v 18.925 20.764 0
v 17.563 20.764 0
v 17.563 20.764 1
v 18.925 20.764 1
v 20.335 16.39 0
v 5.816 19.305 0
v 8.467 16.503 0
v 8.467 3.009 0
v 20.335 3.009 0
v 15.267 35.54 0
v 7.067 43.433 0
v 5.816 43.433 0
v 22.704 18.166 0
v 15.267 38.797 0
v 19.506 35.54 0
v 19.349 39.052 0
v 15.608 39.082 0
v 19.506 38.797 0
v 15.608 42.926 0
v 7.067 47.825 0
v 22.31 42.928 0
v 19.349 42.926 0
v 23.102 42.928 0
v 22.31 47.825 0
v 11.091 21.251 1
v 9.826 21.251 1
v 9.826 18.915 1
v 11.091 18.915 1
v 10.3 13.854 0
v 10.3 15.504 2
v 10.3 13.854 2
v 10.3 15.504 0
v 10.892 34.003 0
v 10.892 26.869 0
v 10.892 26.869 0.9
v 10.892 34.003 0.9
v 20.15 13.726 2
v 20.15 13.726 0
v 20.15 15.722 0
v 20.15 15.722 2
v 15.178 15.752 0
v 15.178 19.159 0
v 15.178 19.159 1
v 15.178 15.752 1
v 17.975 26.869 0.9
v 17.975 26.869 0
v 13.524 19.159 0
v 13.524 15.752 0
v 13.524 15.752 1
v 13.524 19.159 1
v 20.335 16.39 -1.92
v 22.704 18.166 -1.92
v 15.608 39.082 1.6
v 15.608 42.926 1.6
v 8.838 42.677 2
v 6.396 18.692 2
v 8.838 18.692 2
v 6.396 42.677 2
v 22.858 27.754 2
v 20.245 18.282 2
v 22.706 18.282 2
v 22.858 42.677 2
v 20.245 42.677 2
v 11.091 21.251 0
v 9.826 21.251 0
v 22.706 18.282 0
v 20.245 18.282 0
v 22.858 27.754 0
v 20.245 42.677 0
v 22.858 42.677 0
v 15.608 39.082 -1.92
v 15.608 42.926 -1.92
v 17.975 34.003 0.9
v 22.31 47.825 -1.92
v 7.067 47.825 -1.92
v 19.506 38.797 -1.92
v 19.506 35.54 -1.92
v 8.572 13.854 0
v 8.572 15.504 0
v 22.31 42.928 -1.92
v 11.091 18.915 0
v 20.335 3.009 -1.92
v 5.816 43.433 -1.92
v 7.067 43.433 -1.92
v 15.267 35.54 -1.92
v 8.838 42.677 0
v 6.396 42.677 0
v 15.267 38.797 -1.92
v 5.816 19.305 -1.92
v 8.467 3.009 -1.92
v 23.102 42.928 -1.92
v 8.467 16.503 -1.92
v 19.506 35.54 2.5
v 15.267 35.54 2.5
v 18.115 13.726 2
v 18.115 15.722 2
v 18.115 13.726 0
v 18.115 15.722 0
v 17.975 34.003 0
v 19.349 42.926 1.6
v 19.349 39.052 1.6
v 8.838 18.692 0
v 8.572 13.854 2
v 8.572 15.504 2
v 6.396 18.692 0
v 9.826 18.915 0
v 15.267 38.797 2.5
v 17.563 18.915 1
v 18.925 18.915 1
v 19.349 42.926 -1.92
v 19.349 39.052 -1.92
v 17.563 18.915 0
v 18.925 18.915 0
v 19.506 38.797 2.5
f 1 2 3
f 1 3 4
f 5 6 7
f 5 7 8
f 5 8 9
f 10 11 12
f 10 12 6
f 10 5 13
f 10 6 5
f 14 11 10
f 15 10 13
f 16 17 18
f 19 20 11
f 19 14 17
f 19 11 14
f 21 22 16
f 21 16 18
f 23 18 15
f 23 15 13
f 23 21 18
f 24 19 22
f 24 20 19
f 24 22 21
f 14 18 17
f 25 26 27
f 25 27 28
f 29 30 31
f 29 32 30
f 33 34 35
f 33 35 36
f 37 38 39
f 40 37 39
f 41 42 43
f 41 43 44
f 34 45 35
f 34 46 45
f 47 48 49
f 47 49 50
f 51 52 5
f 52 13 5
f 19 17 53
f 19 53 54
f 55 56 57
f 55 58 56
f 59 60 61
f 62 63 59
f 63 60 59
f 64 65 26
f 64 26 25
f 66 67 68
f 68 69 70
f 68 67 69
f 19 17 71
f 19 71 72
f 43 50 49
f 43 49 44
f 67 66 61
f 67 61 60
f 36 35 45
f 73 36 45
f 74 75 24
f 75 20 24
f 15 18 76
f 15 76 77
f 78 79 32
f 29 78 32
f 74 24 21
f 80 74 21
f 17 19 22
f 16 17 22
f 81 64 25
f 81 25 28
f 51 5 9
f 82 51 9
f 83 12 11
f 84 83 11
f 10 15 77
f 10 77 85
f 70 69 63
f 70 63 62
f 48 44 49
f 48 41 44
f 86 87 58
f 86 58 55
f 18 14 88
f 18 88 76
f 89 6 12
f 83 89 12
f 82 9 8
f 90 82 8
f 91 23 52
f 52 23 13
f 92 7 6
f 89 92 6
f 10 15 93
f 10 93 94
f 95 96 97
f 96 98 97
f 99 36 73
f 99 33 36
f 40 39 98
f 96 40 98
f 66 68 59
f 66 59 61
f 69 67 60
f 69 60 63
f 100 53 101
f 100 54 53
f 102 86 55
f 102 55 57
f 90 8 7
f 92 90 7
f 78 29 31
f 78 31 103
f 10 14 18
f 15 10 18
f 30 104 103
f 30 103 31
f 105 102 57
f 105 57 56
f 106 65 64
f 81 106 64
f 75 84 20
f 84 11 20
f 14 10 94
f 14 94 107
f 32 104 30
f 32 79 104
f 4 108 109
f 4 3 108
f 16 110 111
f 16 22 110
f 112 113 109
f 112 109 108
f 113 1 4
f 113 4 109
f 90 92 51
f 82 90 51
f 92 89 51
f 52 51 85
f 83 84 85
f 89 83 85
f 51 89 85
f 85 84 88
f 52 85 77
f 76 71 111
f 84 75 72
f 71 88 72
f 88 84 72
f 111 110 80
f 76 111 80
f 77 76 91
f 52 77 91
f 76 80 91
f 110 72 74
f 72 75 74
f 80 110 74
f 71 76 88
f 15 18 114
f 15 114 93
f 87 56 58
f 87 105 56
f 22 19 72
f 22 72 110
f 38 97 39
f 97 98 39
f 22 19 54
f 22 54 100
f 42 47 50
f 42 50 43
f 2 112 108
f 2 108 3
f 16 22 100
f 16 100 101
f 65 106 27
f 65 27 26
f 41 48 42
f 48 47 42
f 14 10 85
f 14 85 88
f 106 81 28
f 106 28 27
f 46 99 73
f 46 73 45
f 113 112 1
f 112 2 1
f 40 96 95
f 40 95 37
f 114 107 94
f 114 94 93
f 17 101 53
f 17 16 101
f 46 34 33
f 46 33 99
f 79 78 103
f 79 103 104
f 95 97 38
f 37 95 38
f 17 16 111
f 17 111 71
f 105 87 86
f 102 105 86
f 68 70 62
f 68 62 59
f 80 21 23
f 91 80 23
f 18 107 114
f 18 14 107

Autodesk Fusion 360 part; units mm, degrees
sketch "Sketch1" plane through (0, 0, 0) normal (0, 0, 1) x (1, 0, 0)
  line L0 (7.0671, 47.8249) -> (22.3102, 47.8249)
  line L1 (22.3102, 47.8249) -> (22.3102, 42.9285)
  line L2 (22.3102, 42.9285) -> (23.1024, 42.9285)
  line L3 (23.1024, 42.9285) -> (22.7044, 18.166)
  line L4 (22.7044, 18.166) -> (20.3351, 16.3902)
  line L5 (20.3351, 16.3902) -> (20.3351, 3.0086)
  line L6 (20.3351, 3.0086) -> (8.4669, 3.0086)
  line L7 (8.4669, 3.0086) -> (8.4669, 16.5034)
  line L8 (8.4669, 16.5034) -> (5.8161, 19.3048)
  line L9 (5.8161, 19.3048) -> (5.8161, 43.4328)
  line L10 (5.8161, 43.4328) -> (7.0671, 43.4328)
  line L11 (7.0671, 43.4328) -> (7.0671, 47.8249)
  line L12 (15.2672, 35.5395) -> (15.2672, 38.7967)
  line L13 (15.2672, 38.7967) -> (19.5064, 38.7967)
  line L14 (19.5064, 38.7967) -> (19.5064, 35.5395)
  line L15 (19.5064, 35.5395) -> (15.2672, 35.5395)
  line L16 (15.6085, 39.0819) -> (15.6085, 42.9261)
  line L17 (15.6085, 42.9261) -> (19.3493, 42.9261)
  line L18 (19.3493, 42.9261) -> (19.3493, 39.0523)
  line L19 (19.3493, 39.0523) -> (15.6085, 39.0819)
  line L20 (10.8921, 34.0033) -> (17.9754, 34.0033)
  line L21 (17.9754, 34.0033) -> (17.9754, 26.8691)
  line L22 (17.9754, 26.8691) -> (10.8921, 26.8691)
  line L23 (10.8921, 26.8691) -> (10.8921, 34.0033)
  line L24 (13.5241, 19.1586) -> (15.1785, 19.1586)
  line L25 (15.1785, 19.1586) -> (15.1785, 15.7525)
  line L26 (15.1785, 15.7525) -> (13.5241, 15.7525)
  line L27 (13.5241, 15.7525) -> (13.5241, 19.1586)
  line L28 (9.826, 21.251) -> (11.0911, 21.251)
  line L29 (11.0911, 21.251) -> (11.0911, 18.9153)
  line L30 (11.0911, 18.9153) -> (9.826, 18.9153)
  line L31 (9.826, 18.9153) -> (9.826, 21.251)
  line L32 (17.5628, 20.7644) -> (18.9253, 20.7644)
  line L33 (18.9253, 20.7644) -> (18.9253, 18.9153)
  line L34 (18.9253, 18.9153) -> (17.5628, 18.9153)
  line L35 (17.5628, 18.9153) -> (17.5628, 20.7644)
  line L36 (6.3955, 42.6771) -> (8.838, 42.6771)
  line L37 (8.838, 42.6771) -> (8.838, 18.6925)
  line L38 (8.838, 18.6925) -> (6.3955, 18.6925)
  line L39 (6.3955, 18.6925) -> (6.3955, 42.6771)
  line L40 (20.2451, 42.6771) -> (22.8585, 42.6771)
  line L41 (22.8585, 42.6771) -> (22.8585, 18.2815)
  line L42 (22.8585, 18.2815) -> (20.2451, 18.2815)
  line L43 (20.2451, 18.2815) -> (20.2451, 42.6771)
  line L44 (8.5715, 15.5042) -> (10.3004, 15.5042)
  line L45 (10.3004, 15.5042) -> (10.3004, 13.8543)
  line L46 (10.3004, 13.8543) -> (8.5715, 13.8543)
  line L47 (8.5715, 13.8543) -> (8.5715, 15.5042)
  line L48 (20.15, 15.7215) -> (18.1149, 15.7215)
  line L49 (18.1149, 15.7215) -> (18.1149, 13.7259)
  line L50 (18.1149, 13.7259) -> (20.15, 13.7259)
  line L51 (20.15, 13.7259) -> (20.15, 15.7215)
extrude "Extrude13" add sketch "Sketch1" along normal blind 2 contours L44 L45 L46 L47 | L48 L49 L50 L51 makes body 1 at (9.1478, 15.5042, 0.6667) makes body 2 at (18.7933, 13.7259, 0.6667)
extrude "Extrude12" add sketch "Sketch1" along normal blind 2 separate body contours L36 L37 L38 L39 | L3 L40 L41 L42 L43 makes body 3 at (7.2097, 34.6822, 0) makes body 4 at (21.1163, 29.5705, 0)
extrude "Extrude11" add sketch "Sketch1" along normal blind 1 separate body contours L28 L29 L30 L31 | L32 L33 L34 L35 makes body 5 at (10.6694, 19.6939, 0) makes body 6 at (18.017, 20.148, 0)
extrude "Extrude10" add sketch "Sketch1" along normal blind 1 separate body contours L24 L25 L26 L27 makes body 7
extrude "Extrude9" add sketch "Sketch1" along normal blind 0.9 separate body contours L20 L21 L22 L23 makes body 8
extrude "Extrude6" add sketch "Sketch1" along normal blind 1.6 separate body contours L16 L17 L18 L19 makes body 9
extrude "Extrude7" add sketch "Sketch1" along normal blind 2.5 separate body contours L12 L13 L14 L15 makes body 10
extrude "Extrude8" add sketch "Sketch1" against normal blind 1.92 separate body contours L36 L37 L38 L39 | L0 L1 L2 L3 L4 L5 L6 L7 L8 L9 L10 L11 L40 L41 L42 L43 | L3 L40 L41 L42 L43 | L20 L21 L22 L23 | L24 L25 L26 L27 | L28 L29 L30 L31 | L32 L33 L34 L35 | L44 L45 L46 L47 | L48 L49 L50 L51 makes body 11
